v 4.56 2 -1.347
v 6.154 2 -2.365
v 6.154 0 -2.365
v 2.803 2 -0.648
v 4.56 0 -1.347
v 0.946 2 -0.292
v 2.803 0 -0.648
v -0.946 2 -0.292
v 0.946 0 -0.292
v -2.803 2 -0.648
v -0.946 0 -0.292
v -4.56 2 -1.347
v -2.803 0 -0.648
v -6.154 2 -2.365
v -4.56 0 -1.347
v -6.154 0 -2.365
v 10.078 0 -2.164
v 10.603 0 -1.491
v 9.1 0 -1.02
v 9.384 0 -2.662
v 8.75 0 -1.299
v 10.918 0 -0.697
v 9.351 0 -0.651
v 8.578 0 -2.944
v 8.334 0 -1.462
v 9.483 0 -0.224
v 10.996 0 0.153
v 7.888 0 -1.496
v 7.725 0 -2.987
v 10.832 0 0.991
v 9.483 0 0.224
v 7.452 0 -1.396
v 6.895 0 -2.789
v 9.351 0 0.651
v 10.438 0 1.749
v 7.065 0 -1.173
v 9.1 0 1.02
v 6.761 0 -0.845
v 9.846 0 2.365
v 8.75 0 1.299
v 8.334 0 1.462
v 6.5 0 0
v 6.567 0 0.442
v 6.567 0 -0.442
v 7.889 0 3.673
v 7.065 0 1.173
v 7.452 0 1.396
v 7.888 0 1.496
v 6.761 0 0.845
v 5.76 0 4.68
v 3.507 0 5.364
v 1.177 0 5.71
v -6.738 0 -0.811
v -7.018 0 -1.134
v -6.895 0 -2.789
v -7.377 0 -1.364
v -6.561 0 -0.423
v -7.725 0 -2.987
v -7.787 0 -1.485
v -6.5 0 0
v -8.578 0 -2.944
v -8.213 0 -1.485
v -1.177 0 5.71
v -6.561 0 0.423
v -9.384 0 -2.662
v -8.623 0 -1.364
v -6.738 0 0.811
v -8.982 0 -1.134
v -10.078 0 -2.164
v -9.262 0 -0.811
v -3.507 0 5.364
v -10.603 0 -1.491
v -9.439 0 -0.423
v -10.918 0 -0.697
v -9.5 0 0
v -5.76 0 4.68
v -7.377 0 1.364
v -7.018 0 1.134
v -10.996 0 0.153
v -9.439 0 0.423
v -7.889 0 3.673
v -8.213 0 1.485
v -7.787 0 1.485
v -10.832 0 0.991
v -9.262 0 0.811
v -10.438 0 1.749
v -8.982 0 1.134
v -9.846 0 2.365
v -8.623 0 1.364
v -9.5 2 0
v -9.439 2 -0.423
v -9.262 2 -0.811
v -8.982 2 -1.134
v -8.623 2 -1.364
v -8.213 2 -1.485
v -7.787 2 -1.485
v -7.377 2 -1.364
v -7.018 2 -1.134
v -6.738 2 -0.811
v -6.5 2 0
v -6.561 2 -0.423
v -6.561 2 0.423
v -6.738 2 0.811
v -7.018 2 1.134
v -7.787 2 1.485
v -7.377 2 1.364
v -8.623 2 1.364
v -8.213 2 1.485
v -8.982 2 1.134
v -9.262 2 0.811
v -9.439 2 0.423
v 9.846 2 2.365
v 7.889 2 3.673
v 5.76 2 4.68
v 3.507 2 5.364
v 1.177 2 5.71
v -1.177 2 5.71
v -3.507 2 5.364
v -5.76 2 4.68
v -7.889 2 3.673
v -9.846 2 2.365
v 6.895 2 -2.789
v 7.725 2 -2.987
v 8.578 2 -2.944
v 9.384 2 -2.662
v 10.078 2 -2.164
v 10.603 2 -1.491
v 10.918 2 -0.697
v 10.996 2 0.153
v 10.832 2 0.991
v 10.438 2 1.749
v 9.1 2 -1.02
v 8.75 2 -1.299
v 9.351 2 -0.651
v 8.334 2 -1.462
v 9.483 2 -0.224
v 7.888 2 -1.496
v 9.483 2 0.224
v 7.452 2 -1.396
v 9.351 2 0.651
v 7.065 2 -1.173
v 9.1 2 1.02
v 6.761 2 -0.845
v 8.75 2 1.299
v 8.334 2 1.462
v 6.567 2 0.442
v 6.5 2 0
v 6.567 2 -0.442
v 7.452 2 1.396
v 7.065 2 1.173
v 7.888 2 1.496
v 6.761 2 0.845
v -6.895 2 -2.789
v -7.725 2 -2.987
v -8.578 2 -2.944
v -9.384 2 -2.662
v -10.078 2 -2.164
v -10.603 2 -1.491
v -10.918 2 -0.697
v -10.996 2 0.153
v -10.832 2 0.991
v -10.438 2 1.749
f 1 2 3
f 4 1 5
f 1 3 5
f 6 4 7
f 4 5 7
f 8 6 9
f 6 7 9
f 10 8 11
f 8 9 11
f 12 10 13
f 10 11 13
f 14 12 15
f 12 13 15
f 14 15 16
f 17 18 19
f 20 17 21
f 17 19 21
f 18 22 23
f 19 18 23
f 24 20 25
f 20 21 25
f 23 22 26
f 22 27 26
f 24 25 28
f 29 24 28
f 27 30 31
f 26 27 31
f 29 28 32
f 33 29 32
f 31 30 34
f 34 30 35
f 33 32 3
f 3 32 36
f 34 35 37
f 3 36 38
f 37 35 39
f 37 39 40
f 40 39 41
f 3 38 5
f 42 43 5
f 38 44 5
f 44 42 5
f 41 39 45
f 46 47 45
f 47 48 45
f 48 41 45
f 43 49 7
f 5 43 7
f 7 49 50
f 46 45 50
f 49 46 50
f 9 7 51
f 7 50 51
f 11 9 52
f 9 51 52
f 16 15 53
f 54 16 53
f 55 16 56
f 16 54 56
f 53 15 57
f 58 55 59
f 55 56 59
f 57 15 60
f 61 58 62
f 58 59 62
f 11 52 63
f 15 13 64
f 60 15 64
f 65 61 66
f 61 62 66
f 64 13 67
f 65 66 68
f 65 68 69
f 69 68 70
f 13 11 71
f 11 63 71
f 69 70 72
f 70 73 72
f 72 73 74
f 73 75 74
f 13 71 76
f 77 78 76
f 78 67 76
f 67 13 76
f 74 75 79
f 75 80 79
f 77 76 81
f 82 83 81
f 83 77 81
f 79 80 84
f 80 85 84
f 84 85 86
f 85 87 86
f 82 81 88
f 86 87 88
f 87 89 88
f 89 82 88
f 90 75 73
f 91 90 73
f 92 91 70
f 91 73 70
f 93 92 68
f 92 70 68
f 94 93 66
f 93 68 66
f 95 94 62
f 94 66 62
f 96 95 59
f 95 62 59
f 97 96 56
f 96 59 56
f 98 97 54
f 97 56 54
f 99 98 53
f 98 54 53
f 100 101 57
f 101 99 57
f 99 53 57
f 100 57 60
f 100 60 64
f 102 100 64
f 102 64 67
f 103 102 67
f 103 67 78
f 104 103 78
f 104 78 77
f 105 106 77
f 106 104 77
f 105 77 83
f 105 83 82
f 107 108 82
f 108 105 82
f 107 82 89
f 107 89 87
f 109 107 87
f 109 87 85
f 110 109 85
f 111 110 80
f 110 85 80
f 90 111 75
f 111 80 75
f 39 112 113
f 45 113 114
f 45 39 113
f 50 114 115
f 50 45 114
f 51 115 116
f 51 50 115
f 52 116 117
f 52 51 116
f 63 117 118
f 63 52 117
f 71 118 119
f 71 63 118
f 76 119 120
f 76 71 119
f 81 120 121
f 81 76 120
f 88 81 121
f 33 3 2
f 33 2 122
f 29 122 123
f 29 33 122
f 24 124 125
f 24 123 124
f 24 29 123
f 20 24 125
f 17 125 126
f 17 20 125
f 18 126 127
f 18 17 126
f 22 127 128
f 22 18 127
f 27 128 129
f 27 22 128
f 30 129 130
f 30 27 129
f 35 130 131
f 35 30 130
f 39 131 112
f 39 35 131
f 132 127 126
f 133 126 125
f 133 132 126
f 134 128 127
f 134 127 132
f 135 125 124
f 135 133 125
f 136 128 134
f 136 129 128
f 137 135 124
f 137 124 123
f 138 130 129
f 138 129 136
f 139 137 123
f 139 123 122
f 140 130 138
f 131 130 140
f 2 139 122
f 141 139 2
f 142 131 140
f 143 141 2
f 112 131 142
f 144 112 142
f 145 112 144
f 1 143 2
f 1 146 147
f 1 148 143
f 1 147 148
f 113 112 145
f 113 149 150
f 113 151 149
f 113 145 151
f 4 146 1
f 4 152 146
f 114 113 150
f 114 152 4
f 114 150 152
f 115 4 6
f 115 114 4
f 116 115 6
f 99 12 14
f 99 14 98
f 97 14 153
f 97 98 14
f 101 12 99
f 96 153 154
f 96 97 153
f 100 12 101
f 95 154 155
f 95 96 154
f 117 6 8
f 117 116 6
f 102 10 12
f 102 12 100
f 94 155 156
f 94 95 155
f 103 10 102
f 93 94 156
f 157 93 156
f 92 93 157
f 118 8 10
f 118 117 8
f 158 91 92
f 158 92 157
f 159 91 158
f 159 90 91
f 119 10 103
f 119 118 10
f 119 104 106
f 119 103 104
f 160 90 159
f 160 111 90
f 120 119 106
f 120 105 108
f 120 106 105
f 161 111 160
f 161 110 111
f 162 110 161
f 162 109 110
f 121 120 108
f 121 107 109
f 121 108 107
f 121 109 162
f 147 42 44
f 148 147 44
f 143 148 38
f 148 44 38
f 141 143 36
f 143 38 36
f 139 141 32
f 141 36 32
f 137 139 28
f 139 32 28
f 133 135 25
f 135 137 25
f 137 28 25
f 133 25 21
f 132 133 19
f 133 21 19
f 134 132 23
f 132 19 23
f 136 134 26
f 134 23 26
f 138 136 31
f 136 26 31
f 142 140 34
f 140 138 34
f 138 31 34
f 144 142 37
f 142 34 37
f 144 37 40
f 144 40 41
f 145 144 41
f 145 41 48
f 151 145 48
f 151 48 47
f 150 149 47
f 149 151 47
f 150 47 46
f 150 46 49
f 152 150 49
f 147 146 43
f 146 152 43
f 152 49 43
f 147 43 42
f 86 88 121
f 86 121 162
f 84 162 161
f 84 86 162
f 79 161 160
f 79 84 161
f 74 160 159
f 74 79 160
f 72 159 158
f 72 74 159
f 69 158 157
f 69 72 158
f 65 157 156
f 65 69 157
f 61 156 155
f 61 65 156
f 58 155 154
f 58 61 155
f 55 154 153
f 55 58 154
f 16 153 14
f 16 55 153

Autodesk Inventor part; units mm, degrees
ref_plane "YZ Plane" through (0, 0, 0) normal (1, 0, 0) x (0, 1, 0)
ref_plane "XZ Plane" through (0, 0, 0) normal (0, 1, 0) x (-1, 0, 0)
ref_plane "XY Plane" through (0, 0, 0) normal (0, 0, 1) x (1, 0, 0)
sketch "Sketch1" plane through (0, 0, 0) normal (0, 1, 0) x (-1, 0, 0)
  circle A0 centre (8, 0) radius 3
  line L0 (8, 0) -> (-8, 0)
  circle A1 centre (-8, 0) radius 3
  arc A2 (6.1538, -2.3647) -> (-6.1538, -2.3647) centre (0, -10.247) ccw
  line L1 (0, -0.247) -> (0, 5.753)
  arc A3 (9.8462, 2.3647) -> (-9.8462, 2.3647) centre (0, -10.247) ccw
  circle A4 centre (8, 0) radius 1.5
  circle A5 centre (-8, 0) radius 1.5
  point P0 (0, 0)
  dimension "d13" = 16
  dimension "d14" = 6
  dimension "d16" = 6
  dimension "d17" = 3
  dimension "d18" = 3
extrude "Extrusion1" add sketch "Sketch1" along normal blind 2
properties part number "tahlo-neco"
